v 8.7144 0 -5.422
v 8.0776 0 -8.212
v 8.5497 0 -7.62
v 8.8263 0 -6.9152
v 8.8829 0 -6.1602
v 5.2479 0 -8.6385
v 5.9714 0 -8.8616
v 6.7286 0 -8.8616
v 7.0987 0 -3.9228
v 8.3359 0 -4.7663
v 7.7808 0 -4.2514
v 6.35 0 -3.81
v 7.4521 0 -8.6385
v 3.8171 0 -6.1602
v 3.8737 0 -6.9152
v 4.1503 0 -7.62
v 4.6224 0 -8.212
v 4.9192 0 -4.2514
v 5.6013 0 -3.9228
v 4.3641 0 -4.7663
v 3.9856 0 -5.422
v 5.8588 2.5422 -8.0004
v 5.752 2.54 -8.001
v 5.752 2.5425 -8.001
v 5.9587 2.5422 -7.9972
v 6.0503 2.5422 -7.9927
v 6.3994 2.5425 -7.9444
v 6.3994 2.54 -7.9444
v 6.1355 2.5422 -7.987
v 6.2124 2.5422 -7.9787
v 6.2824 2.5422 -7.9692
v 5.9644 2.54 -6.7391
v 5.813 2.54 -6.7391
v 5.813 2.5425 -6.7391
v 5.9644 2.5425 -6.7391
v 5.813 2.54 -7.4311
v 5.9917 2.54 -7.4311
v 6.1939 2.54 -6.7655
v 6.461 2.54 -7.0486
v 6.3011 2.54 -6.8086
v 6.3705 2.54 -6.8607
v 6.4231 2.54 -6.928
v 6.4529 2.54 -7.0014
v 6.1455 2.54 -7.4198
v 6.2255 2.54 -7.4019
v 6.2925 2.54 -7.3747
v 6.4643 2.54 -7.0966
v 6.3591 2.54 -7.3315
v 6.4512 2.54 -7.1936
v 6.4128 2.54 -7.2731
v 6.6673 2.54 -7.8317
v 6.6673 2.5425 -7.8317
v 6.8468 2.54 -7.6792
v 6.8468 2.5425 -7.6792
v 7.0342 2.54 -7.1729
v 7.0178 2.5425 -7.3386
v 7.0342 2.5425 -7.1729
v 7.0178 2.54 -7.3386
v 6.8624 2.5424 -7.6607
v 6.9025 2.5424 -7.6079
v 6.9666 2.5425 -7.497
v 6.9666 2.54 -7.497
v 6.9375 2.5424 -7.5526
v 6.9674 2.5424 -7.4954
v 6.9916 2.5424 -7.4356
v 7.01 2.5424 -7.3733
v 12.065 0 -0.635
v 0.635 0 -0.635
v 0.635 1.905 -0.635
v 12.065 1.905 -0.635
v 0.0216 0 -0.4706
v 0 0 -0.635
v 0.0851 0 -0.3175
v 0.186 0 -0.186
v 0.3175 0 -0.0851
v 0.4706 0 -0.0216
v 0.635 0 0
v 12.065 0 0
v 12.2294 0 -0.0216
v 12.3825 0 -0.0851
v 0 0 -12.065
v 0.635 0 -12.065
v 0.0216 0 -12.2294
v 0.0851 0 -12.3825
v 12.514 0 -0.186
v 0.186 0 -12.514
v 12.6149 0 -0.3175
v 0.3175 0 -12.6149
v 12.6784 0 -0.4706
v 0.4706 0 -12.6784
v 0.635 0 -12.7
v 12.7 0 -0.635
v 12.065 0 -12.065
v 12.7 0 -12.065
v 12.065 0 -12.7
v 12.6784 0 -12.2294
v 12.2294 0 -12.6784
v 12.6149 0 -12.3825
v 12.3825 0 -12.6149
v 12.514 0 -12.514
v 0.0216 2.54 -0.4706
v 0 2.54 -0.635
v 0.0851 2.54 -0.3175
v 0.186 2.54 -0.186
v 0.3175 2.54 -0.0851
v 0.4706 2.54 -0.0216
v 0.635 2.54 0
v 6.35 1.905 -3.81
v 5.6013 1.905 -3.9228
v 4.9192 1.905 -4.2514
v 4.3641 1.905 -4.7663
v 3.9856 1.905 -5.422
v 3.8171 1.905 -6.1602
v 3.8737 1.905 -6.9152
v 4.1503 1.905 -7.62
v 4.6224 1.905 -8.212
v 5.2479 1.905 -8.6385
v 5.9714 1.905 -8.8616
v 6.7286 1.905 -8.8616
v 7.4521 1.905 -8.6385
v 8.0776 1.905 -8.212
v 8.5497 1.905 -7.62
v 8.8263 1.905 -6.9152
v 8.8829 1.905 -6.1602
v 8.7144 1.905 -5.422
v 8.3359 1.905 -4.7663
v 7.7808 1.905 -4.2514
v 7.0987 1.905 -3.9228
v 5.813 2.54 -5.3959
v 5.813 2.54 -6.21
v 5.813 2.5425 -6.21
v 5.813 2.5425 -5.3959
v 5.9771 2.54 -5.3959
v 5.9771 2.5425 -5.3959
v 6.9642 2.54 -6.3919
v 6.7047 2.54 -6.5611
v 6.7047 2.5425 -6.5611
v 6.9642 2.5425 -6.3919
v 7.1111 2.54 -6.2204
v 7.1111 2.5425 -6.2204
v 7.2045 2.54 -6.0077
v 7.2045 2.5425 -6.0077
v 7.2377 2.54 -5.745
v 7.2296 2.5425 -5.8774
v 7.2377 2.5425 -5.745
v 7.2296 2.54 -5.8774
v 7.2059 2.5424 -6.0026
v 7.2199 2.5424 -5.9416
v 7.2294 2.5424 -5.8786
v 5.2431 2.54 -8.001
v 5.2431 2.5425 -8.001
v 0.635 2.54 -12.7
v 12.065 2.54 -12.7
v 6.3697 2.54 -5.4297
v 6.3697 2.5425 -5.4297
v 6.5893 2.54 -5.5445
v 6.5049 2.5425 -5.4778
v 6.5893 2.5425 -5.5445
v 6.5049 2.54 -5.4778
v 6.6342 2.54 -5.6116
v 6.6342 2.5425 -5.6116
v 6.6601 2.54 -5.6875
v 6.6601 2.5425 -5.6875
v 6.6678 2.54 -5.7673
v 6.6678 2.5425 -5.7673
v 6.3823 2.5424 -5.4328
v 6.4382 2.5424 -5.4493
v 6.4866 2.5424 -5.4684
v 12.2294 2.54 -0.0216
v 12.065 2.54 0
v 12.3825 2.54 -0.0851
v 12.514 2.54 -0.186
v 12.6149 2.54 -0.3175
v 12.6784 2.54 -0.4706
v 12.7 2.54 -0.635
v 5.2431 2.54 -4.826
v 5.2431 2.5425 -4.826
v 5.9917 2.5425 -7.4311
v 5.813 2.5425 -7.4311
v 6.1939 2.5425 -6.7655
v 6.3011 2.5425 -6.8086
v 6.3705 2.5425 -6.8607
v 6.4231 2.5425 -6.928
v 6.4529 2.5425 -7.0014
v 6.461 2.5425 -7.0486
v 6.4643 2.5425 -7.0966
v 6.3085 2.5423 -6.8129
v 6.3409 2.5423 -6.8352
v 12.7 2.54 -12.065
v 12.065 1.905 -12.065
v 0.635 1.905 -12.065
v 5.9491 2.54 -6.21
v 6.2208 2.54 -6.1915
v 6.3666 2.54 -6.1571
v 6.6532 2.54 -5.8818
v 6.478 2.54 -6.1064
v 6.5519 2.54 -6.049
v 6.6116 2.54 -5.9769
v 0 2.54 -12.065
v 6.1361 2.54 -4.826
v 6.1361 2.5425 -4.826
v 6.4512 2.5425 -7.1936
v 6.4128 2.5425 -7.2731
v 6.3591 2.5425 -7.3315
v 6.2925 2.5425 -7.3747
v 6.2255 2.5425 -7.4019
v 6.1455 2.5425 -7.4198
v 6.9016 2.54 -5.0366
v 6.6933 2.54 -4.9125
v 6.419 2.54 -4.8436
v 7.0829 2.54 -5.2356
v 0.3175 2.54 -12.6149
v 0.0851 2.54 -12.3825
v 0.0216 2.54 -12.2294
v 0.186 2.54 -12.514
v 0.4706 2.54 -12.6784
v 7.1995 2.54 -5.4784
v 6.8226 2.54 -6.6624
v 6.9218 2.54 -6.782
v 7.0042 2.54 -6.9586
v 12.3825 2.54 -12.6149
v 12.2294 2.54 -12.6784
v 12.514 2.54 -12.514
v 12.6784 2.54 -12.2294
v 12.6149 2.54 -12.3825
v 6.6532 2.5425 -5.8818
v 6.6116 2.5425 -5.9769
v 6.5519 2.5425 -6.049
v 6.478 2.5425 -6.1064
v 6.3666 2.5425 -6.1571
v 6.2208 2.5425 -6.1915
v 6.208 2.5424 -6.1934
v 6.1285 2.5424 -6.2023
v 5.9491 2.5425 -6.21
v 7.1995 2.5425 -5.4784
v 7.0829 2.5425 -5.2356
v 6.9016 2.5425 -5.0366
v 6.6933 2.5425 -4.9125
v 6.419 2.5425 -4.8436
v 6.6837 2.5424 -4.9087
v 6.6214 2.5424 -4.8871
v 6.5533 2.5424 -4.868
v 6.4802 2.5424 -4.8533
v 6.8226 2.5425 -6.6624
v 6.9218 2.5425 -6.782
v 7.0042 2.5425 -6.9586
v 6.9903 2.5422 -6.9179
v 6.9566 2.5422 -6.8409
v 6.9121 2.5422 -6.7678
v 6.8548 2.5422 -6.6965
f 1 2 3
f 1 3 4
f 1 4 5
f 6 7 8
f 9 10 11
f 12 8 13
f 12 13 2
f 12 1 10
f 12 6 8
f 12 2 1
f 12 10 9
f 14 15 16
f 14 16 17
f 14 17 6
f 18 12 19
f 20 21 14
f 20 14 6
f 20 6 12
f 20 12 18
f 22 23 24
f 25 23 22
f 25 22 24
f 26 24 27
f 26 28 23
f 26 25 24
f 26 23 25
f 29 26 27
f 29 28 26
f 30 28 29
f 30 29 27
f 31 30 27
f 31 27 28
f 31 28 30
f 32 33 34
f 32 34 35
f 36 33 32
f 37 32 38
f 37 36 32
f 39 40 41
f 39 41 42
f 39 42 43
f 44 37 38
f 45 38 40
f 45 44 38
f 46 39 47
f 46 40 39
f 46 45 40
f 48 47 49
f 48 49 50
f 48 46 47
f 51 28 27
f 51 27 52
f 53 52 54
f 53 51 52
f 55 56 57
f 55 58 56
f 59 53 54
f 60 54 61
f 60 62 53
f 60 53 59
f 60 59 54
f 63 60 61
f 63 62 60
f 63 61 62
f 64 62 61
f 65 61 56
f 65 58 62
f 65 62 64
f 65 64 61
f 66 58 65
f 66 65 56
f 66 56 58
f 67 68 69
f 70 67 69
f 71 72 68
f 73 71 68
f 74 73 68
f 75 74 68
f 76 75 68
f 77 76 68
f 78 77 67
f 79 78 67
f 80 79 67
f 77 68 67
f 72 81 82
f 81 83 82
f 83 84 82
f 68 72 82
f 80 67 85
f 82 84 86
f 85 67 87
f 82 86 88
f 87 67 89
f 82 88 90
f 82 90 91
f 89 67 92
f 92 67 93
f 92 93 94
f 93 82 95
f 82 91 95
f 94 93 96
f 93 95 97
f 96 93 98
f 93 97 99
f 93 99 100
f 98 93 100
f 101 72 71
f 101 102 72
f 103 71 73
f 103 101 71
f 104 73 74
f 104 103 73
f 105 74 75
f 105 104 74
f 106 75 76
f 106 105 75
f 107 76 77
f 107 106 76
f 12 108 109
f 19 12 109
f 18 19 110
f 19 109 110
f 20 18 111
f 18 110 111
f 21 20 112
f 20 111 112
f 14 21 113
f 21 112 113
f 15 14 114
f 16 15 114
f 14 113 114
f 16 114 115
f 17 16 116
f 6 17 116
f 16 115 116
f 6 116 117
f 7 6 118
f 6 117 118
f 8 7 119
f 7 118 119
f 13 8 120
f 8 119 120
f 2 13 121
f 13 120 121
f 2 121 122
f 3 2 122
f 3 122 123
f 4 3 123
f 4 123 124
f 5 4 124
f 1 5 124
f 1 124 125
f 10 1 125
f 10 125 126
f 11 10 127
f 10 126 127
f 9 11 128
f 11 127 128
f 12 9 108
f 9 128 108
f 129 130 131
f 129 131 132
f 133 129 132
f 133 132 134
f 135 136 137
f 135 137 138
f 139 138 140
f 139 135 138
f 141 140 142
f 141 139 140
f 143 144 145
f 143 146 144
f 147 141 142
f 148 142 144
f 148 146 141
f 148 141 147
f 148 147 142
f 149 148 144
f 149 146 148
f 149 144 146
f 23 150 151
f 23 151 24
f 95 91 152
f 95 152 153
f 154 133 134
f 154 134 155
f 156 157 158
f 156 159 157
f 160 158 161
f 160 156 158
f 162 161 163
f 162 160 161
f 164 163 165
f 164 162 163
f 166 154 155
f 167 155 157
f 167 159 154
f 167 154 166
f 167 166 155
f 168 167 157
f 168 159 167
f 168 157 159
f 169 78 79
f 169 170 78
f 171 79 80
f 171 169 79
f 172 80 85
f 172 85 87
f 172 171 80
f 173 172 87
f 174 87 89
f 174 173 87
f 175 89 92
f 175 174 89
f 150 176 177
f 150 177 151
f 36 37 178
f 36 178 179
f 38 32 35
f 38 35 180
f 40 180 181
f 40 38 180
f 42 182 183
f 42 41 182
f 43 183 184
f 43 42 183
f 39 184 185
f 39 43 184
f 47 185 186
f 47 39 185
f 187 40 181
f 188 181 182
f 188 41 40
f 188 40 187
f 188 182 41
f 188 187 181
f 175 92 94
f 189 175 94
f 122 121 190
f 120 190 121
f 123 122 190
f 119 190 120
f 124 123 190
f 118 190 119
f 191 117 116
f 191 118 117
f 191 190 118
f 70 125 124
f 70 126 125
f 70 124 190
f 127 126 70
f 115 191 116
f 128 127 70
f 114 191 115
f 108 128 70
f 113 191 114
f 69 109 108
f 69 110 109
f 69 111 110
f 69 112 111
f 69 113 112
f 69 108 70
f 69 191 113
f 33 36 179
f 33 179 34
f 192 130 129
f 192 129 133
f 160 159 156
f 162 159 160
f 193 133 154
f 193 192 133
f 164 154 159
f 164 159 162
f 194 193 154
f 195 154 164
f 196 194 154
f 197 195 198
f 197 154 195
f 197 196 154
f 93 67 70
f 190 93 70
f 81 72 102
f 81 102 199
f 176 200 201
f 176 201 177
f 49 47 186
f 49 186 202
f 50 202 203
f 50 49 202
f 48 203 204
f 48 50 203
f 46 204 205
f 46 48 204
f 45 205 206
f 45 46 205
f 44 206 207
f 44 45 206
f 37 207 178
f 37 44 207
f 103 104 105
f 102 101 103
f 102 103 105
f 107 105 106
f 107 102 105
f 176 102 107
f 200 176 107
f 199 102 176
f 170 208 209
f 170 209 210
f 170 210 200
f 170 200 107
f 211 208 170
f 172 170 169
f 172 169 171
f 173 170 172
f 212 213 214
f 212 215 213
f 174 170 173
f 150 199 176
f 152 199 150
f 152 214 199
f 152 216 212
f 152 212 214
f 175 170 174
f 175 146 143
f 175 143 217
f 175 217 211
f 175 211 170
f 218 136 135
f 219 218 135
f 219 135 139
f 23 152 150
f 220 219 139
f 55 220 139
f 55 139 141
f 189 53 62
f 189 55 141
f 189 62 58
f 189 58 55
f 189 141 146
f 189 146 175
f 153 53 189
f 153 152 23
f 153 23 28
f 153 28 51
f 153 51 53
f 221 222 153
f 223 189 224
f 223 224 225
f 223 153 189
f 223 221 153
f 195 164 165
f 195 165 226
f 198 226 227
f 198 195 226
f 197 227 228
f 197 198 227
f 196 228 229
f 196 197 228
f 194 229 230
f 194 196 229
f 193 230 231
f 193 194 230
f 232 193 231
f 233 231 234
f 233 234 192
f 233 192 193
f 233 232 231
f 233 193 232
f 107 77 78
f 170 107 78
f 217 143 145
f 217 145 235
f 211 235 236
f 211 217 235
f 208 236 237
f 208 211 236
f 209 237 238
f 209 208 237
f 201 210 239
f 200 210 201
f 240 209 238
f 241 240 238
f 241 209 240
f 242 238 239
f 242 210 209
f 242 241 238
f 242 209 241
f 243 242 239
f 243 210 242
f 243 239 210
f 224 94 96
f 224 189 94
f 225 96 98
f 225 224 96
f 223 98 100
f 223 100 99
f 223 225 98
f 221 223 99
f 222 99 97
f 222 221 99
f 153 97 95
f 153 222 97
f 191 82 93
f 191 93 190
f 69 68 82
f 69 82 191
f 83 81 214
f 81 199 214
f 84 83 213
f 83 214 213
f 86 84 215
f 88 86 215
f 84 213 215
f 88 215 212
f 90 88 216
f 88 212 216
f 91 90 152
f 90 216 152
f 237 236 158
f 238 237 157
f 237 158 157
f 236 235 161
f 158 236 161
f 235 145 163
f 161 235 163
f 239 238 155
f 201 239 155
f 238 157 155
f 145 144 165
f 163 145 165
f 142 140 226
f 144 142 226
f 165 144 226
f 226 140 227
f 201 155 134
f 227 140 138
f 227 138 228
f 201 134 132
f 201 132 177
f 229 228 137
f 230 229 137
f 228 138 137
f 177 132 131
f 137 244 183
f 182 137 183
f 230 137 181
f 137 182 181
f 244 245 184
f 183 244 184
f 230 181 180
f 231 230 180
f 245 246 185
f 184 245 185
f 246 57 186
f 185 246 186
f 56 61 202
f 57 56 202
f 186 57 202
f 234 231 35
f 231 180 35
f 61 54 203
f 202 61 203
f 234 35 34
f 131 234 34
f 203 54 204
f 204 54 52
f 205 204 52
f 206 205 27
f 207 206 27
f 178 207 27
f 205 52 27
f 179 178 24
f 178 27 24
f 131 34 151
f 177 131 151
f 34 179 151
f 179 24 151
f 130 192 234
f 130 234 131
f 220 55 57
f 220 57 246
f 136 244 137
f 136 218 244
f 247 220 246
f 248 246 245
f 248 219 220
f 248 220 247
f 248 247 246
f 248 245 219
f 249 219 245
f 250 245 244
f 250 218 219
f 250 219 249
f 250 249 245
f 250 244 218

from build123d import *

# Parameters (mm, degrees)
SKETCH1_W           = 12.7
SKETCH1_H           = 12.7
BOSS_EXTRUDE1_DEPTH = 2.54
FILLET1_R           = 0.635
SHELL1_START        = 0.635
SHELL1_OUTLINE_W    = 1.905
SHELL1_OUTLINE_H    = 11.43
SHELL1_DEPTH        = 11.43
SKETCH2_R           = 2.54
BOSS_EXTRUDE2_DEPTH = 1.905
BOSS_EXTRUDE3_DEPTH = 0.00254


# Read off the part's stored shape, not the designer's step: Shell1
with BuildPart() as part:
    # Sketch1 → Boss-Extrude1 (new body)
    with BuildSketch(Plane(origin=(0, 0, 0), x_dir=(1, 0, 0), z_dir=(0, 1, 0))):
        with Locations((6.35, 6.35)):
            Rectangle(SKETCH1_W, SKETCH1_H)
    extrude(amount=BOSS_EXTRUDE1_DEPTH)

    # Fillet1
    fillet1_edges = [part.edges().sort_by_distance(p)[0] for p in [
        (0, 1.27, -12.7),
        (12.7, 1.27, -12.7),
        (12.7, 1.27, 0),
        (0, 1.27, 0),
    ]]
    fillet(fillet1_edges, radius=FILLET1_R)

    # Shell1 outline → Shell1 (cut)
    with BuildSketch(Plane.YZ.offset(SHELL1_START)):
        with Locations((0.9525, -6.35)):
            Rectangle(SHELL1_OUTLINE_W, SHELL1_OUTLINE_H)
    extrude(amount=SHELL1_DEPTH, mode=Mode.SUBTRACT)

    # Sketch2 → Boss-Extrude2 (add)
    with BuildSketch(Plane(origin=(0, 1.905, 0), x_dir=(-1, 0, 0), z_dir=(0, -1, 0))):
        with Locations(Location((-6.35, 6.35, 0), (0, 0, 270))):
            Circle(SKETCH2_R)
    extrude(amount=BOSS_EXTRUDE2_DEPTH)

    # Sketch3 → Boss-Extrude3 (add)
    with BuildSketch(Plane(origin=(0, 2.54, 0), x_dir=(1, 0, 0), z_dir=(0, 1, 0))):
        with BuildLine():
            Line((5.243146154, 4.826), (5.243146154, 8.001))
            Line((5.243146154, 8.001), (5.751960256, 8.001))
            add(Edge.make_bspline(
                [(5.751960256, 8.001), (5.787580425, 8.001004065), (5.856504776, 8.001011931), (5.955944627, 7.99751993), (6.048166691, 7.993002635), (6.132877481, 7.987948833), (6.210221182, 7.979240122), (6.280080178, 7.970062092), (6.34259405, 7.958993954), (6.381242981, 7.94906549), (6.399426202, 7.944394431)],
                knots=[0, 0, 0, 0, 1.311965854, 2.538629056, 3.664479157, 4.713267157, 5.663616078, 6.530575999, 7.308677837, 8, 8, 8, 8], degree=3))
            add(Edge.make_bspline(
                [(6.399426202, 7.944394431), (6.423302618, 7.937805819), (6.470155811, 7.924876846), (6.537264535, 7.898766227), (6.600926521, 7.869742423), (6.661064039, 7.836631691), (6.717307821, 7.799034291), (6.769444122, 7.75665184), (6.818597392, 7.711185567), (6.863022312, 7.66136834), (6.903175119, 7.608727211), (6.93806071, 7.553275975), (6.968371817, 7.495862516), (6.992628642, 7.435764324), (7.010905704, 7.373258168), (7.02427347, 7.308610959), (7.032937594, 7.241618137), (7.03375624, 7.19604073), (7.034171795, 7.172905048)],
                knots=[0, 0, 0, 0, 1.099996261, 2.158545794, 3.195537121, 4.207578794, 5.205712374, 6.197378256, 7.190519799, 8.17788031, 9.159561366, 10.129234751, 11.085776129, 12.040971148, 13.00380137, 13.975669004, 14.972423361, 16, 16, 16, 16], degree=3))
            add(Edge.make_bspline(
                [(7.034171795, 7.172905048), (7.033085241, 7.143181769), (7.030946494, 7.084675147), (7.01728403, 6.998739505), (6.99166478, 6.917517971), (6.958142616, 6.839513663), (6.912562953, 6.765017538), (6.854685596, 6.694065017), (6.785447969, 6.624471365), (6.732338887, 6.582754665), (6.704714663, 6.56105609)],
                knots=[0, 0, 0, 0, 0.986156485, 1.941127874, 2.875419072, 3.804401753, 4.751181392, 5.761612777, 6.835722519, 8, 8, 8, 8], degree=3))
            add(Edge.make_bspline(
                [(6.704714663, 6.56105609), (6.727100009, 6.549628565), (6.770991478, 6.527222351), (6.833304469, 6.490393223), (6.890999497, 6.451220775), (6.944335248, 6.410493172), (6.992192945, 6.366483912), (7.036548712, 6.321728868), (7.075214265, 6.273663764), (7.109790168, 6.22400173), (7.139842981, 6.172023655), (7.166015667, 6.117817318), (7.188122796, 6.061197538), (7.206843685, 6.002452465), (7.220805729, 5.941380042), (7.229909278, 5.877958428), (7.236879525, 5.812403923), (7.237421744, 5.76774983), (7.237697436, 5.745045473)],
                knots=[0, 0, 0, 0, 1.164658916, 2.283573913, 3.35186032, 4.395461096, 5.390182219, 6.362969632, 7.312859996, 8.245001507, 9.165155236, 10.092416118, 11.032087915, 11.979892451, 12.947605196, 13.931445124, 14.948243989, 16, 16, 16, 16], degree=3))
            add(Edge.make_bspline(
                [(7.237697436, 5.745045473), (7.235908383, 5.701681448), (7.232377694, 5.616102718), (7.20656302, 5.490453489), (7.161808578, 5.371326623), (7.101712592, 5.259195582), (7.027662773, 5.157306375), (6.942526717, 5.068052315), (6.847161548, 4.992500734), (6.759175654, 4.941509278), (6.683074784, 4.907289243), (6.620041855, 4.886132259), (6.552345826, 4.866532461), (6.478746667, 4.852769079), (6.400578631, 4.840171317), (6.317079575, 4.832393198), (6.228405558, 4.827122159), (6.167500409, 4.826381615), (6.136114904, 4.826)],
                knots=[0, 0, 0, 0, 1.284142165, 2.534249414, 3.780121997, 5.041676246, 6.291546858, 7.49970053, 8.684500223, 9.883330709, 10.50184324, 11.153274765, 11.851151195, 12.587658647, 13.369265475, 14.195992086, 15.070362669, 16, 16, 16, 16], degree=3))
            Line((6.136114904, 4.826), (5.243146154, 4.826))
        make_face()
        with BuildLine():
            Line((5.813017949, 7.431128205), (5.813017949, 6.739141026))
            Line((5.813017949, 6.739141026), (5.964390144, 6.739141026))
            add(Edge.make_bspline(
                [(5.964390144, 6.739141026), (5.984962986, 6.739320429), (6.024677611, 6.739666755), (6.082041174, 6.744127321), (6.135380025, 6.751737323), (6.184491859, 6.762355191), (6.229834171, 6.775838335), (6.271117303, 6.792061461), (6.308159738, 6.811855437), (6.351194481, 6.841339439), (6.396685308, 6.884726468), (6.436730371, 6.94740802), (6.460316645, 7.019491567), (6.46294352, 7.070330466), (6.4643, 7.096582933)],
                knots=[0, 0, 0, 0, 1.065314748, 2.056525647, 2.977365736, 3.853934255, 4.656397591, 5.425096493, 6.14721249, 6.826394842, 8.123232004, 9.372140726, 10.643011755, 12, 12, 12, 12], degree=3))
            add(Edge.make_bspline(
                [(6.4643, 7.096582933), (6.463214568, 7.12117273), (6.461115928, 7.168716114), (6.437367582, 7.235471259), (6.400481706, 7.29462998), (6.356932744, 7.335119286), (6.315922935, 7.362772289), (6.280807819, 7.380980614), (6.242266343, 7.39728052), (6.199552384, 7.409743825), (6.152909864, 7.419095851), (6.10256535, 7.425963794), (6.048431981, 7.430638408), (6.011041948, 7.430961437), (5.991738902, 7.431128205)],
                knots=[0, 0, 0, 0, 1.347982417, 2.606269829, 3.849316587, 5.153353503, 5.842674298, 6.568177932, 7.326619318, 8.142485038, 9.012069166, 9.942760135, 10.937925643, 12, 12, 12, 12], degree=3))
            Line((5.991738902, 7.431128205), (5.813017949, 7.431128205))
        make_face(mode=Mode.SUBTRACT)
        with BuildLine():
            Line((5.813017949, 6.209974359), (5.813017949, 5.395871795))
            Line((5.813017949, 5.395871795), (5.977110497, 5.395871795))
            add(Edge.make_bspline(
                [(5.977110497, 5.395871795), (6.009551802, 5.396057131), (6.071924261, 5.396413462), (6.161272697, 5.400718795), (6.242512762, 5.408478398), (6.315429202, 5.418165637), (6.3801337, 5.431290331), (6.436407542, 5.447976697), (6.485022448, 5.466334606), (6.525686923, 5.489008804), (6.558907469, 5.515395947), (6.588885529, 5.542364242), (6.613327771, 5.573474717), (6.632666929, 5.607391887), (6.649404936, 5.643273225), (6.65950012, 5.682519883), (6.667186238, 5.723968686), (6.667609226, 5.752637926), (6.667825641, 5.76730609)],
                knots=[0, 0, 0, 0, 1.753078804, 3.370512758, 4.83203934, 6.162291463, 7.344201807, 8.395507345, 9.331626367, 10.147333109, 10.898971645, 11.62040215, 12.321813352, 13.025280112, 13.727906689, 14.453419512, 15.208716525, 16, 16, 16, 16], degree=3))
            add(Edge.make_bspline(
                [(6.667825641, 5.76730609), (6.667348384, 5.784079366), (6.666418815, 5.816749196), (6.658827018, 5.864499638), (6.645030243, 5.909077845), (6.627652532, 5.95162374), (6.603470524, 5.990614032), (6.574731033, 6.027398029), (6.540006391, 6.060730109), (6.500956506, 6.092626322), (6.455408681, 6.120553184), (6.403341547, 6.144784684), (6.344472246, 6.165021941), (6.278618424, 6.181134857), (6.206068781, 6.194809667), (6.126293782, 6.202975038), (6.039957822, 6.209047983), (5.980091063, 6.209658551), (5.949125721, 6.209974359)],
                knots=[0, 0, 0, 0, 0.845221588, 1.646264278, 2.427170338, 3.19324141, 3.95557735, 4.731569926, 5.540061037, 6.376114724, 7.268642756, 8.224665384, 9.265483498, 10.400594375, 11.639216012, 12.983232105, 14.439614077, 16, 16, 16, 16], degree=3))
            Line((5.949125721, 6.209974359), (5.813017949, 6.209974359))
        make_face(mode=Mode.SUBTRACT)
    extrude(amount=BOSS_EXTRUDE3_DEPTH)


solid = part.part
